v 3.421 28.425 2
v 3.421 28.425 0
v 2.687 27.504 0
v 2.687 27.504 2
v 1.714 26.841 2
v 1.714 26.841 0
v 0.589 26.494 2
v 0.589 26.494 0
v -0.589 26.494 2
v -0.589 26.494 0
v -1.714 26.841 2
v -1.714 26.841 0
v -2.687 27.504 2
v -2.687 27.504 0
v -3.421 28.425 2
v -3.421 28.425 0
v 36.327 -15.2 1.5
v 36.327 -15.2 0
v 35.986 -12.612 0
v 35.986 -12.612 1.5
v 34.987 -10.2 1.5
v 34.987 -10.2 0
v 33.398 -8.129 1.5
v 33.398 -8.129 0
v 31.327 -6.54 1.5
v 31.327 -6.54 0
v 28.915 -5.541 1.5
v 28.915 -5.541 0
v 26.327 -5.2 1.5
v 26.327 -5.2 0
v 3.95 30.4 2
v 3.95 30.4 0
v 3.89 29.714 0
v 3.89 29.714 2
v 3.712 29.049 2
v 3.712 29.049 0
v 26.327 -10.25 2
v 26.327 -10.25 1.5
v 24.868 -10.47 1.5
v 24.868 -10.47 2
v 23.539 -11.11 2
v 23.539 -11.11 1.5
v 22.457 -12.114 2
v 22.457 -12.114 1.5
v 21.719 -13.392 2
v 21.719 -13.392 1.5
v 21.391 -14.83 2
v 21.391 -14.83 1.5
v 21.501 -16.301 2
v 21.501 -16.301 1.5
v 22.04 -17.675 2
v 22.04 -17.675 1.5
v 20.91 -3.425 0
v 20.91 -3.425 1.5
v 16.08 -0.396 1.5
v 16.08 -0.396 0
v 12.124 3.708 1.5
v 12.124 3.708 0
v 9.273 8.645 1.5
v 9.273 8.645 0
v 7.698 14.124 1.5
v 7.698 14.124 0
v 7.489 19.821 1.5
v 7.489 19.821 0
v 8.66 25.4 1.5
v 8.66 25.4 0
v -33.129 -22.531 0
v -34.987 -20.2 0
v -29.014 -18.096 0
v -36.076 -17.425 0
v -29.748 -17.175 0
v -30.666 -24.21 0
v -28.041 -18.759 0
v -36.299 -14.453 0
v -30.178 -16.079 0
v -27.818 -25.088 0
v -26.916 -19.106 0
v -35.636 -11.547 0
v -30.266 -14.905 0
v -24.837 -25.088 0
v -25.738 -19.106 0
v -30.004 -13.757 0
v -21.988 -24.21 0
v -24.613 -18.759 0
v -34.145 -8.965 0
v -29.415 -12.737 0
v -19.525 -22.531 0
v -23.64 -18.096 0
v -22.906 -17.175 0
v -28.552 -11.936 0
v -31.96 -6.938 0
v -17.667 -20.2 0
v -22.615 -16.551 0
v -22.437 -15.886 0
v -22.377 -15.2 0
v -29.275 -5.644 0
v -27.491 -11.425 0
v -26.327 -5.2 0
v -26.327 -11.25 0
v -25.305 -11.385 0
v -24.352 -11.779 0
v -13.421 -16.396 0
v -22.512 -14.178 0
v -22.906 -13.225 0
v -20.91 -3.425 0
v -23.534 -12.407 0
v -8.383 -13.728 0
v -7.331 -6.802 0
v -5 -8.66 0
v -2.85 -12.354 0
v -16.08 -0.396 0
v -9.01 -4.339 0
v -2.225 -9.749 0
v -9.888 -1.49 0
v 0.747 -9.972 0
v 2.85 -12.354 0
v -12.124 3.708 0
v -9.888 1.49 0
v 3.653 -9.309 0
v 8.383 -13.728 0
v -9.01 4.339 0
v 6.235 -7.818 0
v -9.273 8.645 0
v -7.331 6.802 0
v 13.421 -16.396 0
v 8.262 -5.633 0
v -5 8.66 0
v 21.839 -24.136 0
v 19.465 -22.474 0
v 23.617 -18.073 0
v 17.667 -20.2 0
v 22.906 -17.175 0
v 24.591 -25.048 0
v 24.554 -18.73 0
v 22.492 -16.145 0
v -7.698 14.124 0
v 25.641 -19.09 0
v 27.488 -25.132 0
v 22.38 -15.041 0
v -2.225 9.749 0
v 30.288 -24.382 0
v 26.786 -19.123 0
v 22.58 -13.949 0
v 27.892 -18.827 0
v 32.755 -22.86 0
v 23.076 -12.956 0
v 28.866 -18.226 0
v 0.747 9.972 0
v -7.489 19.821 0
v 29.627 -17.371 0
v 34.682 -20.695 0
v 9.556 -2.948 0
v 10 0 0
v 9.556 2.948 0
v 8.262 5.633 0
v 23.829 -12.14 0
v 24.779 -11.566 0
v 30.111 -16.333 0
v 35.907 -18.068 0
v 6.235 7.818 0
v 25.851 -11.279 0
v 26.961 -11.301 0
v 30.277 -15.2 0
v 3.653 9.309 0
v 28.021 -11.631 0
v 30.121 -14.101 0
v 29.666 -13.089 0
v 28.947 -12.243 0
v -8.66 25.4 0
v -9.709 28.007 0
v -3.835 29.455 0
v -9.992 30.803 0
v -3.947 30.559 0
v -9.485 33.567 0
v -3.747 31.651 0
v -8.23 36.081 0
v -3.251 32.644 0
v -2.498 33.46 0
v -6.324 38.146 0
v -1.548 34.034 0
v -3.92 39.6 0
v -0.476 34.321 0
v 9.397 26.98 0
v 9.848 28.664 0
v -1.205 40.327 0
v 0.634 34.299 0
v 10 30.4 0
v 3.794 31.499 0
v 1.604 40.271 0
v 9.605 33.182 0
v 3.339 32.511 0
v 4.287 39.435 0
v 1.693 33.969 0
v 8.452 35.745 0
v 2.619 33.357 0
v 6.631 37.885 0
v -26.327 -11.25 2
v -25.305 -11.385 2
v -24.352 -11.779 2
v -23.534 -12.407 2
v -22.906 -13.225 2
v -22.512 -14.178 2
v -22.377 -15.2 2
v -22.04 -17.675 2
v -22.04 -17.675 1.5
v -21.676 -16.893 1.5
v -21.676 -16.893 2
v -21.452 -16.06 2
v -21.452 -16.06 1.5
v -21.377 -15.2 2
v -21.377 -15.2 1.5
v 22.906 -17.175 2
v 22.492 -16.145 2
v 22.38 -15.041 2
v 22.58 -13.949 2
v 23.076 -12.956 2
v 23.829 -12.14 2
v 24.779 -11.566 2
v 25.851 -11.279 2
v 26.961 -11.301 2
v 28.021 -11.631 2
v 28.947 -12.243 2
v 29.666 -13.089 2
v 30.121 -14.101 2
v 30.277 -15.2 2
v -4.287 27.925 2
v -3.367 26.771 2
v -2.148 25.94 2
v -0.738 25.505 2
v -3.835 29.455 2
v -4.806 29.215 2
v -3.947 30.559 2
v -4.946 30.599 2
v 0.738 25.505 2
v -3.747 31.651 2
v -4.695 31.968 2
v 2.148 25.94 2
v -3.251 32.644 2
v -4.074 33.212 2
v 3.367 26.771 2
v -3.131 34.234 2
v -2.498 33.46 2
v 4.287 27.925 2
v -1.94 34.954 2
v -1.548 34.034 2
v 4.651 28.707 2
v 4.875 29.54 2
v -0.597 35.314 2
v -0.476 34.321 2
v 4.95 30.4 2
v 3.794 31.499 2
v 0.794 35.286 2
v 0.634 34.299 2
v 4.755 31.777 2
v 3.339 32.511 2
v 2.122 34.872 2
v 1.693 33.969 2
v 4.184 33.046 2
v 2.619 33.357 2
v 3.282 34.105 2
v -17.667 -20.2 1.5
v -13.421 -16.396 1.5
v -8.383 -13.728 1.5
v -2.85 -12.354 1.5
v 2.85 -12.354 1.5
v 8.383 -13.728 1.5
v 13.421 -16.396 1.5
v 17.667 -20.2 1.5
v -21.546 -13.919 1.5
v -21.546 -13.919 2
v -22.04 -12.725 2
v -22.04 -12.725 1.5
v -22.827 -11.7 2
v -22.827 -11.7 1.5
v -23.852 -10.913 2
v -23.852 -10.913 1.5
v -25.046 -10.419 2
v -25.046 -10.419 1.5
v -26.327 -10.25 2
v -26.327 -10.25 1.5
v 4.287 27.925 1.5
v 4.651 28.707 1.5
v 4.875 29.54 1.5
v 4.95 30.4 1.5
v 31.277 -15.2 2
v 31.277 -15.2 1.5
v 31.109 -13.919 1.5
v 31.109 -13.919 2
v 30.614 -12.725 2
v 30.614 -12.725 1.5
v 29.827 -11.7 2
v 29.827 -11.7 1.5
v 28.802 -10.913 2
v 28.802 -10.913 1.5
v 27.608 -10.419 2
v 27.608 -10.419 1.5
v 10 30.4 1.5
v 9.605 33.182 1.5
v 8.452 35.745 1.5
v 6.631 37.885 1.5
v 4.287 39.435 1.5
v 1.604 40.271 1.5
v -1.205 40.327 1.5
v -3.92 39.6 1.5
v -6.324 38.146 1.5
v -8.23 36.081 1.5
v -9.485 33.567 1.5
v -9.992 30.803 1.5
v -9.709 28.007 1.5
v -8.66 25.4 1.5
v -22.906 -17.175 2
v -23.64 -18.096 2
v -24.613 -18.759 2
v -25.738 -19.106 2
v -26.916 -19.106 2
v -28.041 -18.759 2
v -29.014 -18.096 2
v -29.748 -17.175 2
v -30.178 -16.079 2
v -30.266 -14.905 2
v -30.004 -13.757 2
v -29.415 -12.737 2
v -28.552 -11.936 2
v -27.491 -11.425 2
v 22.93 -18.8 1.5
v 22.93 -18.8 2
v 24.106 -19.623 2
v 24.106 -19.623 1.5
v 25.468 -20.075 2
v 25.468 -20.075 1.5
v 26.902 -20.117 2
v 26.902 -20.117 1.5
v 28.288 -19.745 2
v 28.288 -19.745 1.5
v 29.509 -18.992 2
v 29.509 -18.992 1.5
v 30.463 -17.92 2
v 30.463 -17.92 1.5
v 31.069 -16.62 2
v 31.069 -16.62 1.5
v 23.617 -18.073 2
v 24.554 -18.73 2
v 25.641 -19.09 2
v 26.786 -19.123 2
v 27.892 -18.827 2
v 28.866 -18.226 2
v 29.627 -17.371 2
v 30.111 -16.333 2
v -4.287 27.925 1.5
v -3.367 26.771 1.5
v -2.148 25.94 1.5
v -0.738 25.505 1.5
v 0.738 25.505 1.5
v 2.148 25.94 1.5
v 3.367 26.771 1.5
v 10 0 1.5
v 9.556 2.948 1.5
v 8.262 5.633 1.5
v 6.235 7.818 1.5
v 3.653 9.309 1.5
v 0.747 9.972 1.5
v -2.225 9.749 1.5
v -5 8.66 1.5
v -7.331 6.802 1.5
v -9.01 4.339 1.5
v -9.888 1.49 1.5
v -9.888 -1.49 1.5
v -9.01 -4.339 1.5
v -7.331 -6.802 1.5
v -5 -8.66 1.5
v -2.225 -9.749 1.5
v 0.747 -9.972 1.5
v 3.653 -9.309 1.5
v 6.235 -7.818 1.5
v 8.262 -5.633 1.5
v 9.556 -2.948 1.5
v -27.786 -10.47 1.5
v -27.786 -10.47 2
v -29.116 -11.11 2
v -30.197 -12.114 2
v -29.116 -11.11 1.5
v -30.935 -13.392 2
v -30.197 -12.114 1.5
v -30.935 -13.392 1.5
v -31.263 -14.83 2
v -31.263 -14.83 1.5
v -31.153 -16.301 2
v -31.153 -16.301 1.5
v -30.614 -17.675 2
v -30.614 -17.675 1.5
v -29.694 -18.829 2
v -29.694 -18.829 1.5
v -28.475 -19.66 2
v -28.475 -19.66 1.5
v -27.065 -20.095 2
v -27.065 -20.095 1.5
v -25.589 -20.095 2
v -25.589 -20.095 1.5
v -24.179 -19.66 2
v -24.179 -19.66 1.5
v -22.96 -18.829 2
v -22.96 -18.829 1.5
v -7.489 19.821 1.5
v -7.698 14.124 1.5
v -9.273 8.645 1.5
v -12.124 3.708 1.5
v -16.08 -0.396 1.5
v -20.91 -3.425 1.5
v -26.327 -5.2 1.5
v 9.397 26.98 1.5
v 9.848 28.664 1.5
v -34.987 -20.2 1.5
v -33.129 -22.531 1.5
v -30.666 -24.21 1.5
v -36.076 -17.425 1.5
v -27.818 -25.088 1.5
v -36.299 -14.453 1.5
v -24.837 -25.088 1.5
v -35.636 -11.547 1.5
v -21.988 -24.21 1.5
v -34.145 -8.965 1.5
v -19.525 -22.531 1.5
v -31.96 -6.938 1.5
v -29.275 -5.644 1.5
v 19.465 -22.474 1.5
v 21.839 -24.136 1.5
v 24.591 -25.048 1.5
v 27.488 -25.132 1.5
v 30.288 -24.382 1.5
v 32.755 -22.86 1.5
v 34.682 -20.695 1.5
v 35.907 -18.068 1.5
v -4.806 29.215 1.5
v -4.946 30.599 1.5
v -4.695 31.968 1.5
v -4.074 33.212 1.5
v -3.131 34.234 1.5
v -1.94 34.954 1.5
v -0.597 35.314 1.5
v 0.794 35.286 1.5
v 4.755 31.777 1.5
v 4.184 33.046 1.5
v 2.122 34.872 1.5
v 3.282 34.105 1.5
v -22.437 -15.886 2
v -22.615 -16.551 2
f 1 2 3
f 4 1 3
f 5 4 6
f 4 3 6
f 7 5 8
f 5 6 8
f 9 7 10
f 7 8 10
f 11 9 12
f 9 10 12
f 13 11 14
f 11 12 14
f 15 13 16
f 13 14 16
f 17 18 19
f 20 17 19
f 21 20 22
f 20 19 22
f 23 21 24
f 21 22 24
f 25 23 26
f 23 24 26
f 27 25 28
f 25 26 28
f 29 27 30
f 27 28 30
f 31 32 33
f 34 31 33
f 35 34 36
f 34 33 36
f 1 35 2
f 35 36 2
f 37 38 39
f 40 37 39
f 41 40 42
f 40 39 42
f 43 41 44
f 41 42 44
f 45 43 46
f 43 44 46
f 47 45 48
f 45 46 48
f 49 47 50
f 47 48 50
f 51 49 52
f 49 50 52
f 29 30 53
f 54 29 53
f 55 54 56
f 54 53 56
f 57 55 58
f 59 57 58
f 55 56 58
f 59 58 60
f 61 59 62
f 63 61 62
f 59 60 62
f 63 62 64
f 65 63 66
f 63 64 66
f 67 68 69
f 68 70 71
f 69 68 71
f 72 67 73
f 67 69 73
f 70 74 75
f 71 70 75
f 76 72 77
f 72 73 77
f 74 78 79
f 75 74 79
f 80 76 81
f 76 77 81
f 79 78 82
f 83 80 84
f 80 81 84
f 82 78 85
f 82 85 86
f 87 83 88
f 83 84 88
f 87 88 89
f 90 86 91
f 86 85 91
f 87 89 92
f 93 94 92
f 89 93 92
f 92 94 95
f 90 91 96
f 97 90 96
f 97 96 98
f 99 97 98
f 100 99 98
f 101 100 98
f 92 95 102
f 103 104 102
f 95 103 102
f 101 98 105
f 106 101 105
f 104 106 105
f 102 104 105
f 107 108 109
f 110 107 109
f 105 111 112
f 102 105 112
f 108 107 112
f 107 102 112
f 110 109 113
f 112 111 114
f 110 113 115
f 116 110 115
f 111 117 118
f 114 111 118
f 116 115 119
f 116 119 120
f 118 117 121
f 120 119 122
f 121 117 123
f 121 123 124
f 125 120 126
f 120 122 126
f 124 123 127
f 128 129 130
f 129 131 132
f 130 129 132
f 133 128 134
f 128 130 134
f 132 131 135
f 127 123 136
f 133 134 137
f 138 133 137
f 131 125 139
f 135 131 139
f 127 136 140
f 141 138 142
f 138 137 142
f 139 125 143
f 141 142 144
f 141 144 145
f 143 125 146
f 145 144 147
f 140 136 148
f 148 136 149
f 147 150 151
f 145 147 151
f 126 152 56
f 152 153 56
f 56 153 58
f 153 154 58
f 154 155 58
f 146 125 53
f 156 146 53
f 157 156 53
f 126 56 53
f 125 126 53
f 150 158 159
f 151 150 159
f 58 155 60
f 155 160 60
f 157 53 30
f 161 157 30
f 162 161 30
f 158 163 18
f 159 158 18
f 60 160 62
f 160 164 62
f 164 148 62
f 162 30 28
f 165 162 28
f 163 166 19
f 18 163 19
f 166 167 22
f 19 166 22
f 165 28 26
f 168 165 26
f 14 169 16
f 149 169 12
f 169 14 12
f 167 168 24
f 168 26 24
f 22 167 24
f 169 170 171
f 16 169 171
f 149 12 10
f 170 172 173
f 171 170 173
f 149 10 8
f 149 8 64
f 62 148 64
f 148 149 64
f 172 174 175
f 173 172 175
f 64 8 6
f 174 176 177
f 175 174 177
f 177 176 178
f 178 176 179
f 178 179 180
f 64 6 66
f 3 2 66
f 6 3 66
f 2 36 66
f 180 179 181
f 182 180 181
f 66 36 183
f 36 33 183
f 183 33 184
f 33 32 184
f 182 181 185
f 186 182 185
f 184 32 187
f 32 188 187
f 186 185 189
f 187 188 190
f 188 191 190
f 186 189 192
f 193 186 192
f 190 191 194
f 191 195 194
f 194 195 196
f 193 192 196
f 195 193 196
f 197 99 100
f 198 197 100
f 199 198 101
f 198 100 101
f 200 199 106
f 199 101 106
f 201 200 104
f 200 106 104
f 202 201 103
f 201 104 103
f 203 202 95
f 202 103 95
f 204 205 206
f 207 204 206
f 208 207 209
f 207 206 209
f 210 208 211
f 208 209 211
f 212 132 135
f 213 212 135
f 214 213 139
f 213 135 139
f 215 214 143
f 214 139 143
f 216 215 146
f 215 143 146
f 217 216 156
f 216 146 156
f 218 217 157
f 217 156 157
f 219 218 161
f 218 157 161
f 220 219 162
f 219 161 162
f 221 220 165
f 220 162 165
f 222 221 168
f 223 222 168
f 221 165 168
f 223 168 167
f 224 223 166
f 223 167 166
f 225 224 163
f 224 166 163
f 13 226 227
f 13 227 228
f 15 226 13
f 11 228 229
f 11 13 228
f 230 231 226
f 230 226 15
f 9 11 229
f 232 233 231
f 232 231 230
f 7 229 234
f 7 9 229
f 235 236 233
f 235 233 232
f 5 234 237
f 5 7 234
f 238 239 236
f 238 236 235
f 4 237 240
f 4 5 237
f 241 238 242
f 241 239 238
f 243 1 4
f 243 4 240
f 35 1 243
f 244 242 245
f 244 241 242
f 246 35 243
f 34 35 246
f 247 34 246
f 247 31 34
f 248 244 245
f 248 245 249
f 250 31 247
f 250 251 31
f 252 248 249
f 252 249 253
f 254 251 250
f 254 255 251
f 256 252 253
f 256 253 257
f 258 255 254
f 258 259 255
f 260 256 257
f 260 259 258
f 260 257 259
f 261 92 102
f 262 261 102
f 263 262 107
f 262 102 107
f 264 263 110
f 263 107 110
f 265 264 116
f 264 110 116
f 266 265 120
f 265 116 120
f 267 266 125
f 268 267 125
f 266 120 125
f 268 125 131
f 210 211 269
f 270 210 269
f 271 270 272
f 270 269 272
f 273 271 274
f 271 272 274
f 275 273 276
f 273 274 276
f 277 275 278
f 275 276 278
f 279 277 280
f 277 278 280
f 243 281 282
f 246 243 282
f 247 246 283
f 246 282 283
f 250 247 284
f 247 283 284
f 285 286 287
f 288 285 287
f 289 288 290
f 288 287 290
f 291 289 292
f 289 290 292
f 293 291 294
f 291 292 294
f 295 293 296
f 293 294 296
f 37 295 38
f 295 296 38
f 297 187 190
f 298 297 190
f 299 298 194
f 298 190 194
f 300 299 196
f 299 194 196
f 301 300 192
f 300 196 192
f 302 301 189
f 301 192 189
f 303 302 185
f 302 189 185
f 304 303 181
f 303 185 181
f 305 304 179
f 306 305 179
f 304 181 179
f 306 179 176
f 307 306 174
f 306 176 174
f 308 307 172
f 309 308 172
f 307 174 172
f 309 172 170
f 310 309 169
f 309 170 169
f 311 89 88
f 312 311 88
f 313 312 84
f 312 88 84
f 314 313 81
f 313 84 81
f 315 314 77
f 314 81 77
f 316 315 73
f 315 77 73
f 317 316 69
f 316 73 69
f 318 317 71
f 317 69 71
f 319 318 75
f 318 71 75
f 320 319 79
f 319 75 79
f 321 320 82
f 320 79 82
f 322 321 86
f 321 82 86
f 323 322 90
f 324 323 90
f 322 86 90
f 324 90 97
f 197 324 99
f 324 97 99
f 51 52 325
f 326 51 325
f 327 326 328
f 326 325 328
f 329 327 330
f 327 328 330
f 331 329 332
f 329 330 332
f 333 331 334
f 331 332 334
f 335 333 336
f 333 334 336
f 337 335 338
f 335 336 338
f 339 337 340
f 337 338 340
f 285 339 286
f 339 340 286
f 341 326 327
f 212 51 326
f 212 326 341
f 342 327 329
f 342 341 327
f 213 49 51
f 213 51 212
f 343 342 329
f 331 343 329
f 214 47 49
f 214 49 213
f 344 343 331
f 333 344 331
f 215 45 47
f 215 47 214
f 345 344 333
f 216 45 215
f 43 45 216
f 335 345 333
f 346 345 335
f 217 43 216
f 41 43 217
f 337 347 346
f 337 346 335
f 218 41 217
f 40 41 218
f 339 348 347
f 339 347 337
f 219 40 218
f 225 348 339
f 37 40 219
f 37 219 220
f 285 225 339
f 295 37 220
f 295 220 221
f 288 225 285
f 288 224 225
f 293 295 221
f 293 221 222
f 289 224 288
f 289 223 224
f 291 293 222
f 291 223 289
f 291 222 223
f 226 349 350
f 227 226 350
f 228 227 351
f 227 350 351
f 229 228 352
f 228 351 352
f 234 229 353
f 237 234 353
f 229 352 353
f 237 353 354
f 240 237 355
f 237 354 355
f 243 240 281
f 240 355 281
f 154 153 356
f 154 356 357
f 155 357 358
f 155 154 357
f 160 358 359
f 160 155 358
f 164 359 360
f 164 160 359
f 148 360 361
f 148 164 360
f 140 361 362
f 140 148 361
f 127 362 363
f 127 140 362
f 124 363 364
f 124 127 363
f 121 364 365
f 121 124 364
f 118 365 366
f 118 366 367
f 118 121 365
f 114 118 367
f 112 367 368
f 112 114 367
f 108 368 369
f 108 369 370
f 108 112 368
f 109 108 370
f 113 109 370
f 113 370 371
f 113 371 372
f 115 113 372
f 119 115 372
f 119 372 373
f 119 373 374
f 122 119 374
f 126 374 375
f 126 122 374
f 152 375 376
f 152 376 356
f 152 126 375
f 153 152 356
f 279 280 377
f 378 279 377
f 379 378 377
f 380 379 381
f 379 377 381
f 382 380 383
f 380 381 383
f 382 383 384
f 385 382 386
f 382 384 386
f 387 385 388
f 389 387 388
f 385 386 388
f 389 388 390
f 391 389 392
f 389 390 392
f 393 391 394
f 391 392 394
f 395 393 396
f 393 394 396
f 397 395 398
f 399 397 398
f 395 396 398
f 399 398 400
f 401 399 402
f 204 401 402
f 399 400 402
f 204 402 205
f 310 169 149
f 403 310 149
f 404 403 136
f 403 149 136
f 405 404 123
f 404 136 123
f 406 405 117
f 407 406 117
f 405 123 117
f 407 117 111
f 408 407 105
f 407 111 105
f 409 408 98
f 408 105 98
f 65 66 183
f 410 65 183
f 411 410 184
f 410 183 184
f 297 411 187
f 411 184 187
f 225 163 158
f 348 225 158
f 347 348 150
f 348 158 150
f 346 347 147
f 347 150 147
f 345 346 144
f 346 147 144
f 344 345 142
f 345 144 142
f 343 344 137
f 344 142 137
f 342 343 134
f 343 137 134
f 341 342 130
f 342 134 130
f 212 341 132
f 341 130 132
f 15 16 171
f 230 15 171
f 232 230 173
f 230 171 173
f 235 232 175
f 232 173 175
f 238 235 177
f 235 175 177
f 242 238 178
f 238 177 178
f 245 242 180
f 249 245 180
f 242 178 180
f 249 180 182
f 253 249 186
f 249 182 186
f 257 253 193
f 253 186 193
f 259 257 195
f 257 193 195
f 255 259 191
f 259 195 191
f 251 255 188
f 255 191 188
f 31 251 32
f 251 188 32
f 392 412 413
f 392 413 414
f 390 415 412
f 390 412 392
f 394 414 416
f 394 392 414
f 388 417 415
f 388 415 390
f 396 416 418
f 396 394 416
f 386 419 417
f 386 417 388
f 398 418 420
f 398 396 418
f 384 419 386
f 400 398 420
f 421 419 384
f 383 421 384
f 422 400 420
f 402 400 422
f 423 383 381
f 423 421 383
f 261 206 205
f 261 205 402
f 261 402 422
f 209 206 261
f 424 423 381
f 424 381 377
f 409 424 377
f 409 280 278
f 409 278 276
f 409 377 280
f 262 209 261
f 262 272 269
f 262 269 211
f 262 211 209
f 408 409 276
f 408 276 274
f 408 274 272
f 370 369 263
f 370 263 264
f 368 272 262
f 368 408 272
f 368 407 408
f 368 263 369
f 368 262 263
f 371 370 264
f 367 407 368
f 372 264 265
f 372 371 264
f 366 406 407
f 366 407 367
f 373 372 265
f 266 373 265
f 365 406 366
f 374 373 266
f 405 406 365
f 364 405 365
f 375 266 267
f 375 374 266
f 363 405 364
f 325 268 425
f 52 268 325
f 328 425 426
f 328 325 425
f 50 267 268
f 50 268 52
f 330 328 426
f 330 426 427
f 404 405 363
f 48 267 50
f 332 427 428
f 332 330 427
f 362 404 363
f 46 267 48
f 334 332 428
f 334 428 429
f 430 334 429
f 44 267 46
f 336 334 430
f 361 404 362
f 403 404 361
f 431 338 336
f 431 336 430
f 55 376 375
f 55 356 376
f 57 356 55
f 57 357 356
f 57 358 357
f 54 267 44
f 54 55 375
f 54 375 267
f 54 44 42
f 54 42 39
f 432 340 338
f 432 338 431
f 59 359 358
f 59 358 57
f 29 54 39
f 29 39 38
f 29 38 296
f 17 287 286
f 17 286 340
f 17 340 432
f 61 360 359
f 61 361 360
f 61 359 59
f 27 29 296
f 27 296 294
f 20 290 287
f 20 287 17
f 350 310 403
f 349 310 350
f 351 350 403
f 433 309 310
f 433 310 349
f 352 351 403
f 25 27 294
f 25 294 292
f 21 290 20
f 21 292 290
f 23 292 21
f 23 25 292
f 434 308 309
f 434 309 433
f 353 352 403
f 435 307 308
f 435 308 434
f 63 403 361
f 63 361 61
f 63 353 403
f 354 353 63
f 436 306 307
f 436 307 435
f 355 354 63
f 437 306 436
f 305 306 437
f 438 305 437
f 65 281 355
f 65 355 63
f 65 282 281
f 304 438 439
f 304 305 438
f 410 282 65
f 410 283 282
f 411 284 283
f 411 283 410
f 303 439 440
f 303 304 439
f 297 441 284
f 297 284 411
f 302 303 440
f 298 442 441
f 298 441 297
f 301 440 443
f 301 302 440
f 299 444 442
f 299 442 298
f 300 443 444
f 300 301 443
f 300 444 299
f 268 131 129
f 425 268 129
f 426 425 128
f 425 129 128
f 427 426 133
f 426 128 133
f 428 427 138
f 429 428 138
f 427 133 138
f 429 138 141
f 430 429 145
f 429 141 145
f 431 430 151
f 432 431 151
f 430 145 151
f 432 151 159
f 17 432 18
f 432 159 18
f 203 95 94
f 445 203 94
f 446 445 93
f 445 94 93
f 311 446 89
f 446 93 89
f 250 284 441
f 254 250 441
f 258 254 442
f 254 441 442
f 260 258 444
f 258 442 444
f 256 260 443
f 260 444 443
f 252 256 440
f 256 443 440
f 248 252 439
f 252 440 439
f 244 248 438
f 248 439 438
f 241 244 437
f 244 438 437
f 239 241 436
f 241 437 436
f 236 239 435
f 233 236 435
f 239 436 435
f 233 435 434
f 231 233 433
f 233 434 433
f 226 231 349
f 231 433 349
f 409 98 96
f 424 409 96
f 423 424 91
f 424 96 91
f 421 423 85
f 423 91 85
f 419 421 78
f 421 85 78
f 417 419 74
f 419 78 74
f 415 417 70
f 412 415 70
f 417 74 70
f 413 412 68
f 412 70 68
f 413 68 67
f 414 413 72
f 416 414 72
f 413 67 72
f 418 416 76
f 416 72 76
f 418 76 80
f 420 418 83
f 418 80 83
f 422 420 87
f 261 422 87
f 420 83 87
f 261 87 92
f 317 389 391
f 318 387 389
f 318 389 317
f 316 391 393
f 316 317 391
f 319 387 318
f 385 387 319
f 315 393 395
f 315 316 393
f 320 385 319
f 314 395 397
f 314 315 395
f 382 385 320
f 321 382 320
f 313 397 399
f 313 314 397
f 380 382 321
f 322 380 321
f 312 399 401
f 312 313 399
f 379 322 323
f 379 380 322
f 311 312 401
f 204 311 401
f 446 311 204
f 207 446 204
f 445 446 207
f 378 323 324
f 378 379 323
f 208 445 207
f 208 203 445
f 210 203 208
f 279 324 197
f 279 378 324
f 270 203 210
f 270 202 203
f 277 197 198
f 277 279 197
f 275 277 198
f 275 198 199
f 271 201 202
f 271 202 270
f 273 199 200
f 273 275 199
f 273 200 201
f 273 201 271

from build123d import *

# Parameters (mm, degrees)
F0_R     = 10
F1_DEPTH = 1.5
F2_DEPTH = 2


with BuildPart() as f1:
    # F0 (on Top) → F1 (new body)
    with BuildSketch(Plane.XY):
        with BuildLine():
            ThreePointArc((8.6602540378, 25.4), (0, 20.4), (-8.6602540378, 25.4))
            ThreePointArc((-8.6602540378, 25.4), (-10.5481894181, 6.09), (-26.327172275, -5.2))
            ThreePointArc((-26.327172275, -5.2), (-19.2561044632, -8.1289321881), (-16.327172275, -15.2))
            ThreePointArc((-16.327172275, -15.2), (-16.6679140122, -17.788190451), (-17.6669182372, -20.2))
            ThreePointArc((-17.6669182372, -20.2), (0, -12.18), (17.6669182372, -20.2))
            ThreePointArc((17.6669182372, -20.2), (17.6669182372, -10.2), (26.327172275, -5.2))
            ThreePointArc((26.327172275, -5.2), (10.5481894181, 6.09), (8.6602540378, 25.4))
        make_face()
        Circle(F0_R, mode=Mode.SUBTRACT)
        with BuildLine():
            ThreePointArc((4.2868257487, 27.925), (0, 25.45), (-4.2868257487, 27.925))
            Line((-4.2868257487, 27.925), (-8.6602540378, 25.4))
            ThreePointArc((-8.6602540378, 25.4), (0, 20.4), (8.6602540378, 25.4))
            Line((8.6602540378, 25.4), (4.2868257487, 27.925))
        make_face()
        with BuildLine():
            Line((-8.6602540378, 25.4), (-4.2868257487, 27.925))
            ThreePointArc((-4.2868257487, 27.925), (-1.2811542733, 35.1813328401), (4.95, 30.4))
            ThreePointArc((4.95, 30.4), (4.7813328401, 29.1188457267), (4.2868257487, 27.925))
            Line((4.2868257487, 27.925), (8.6602540378, 25.4))
            ThreePointArc((8.6602540378, 25.4), (9.6592582629, 27.811809549), (10, 30.4))
            ThreePointArc((10, 30.4), (-2.588190451, 40.0592582629), (-8.6602540378, 25.4))
        make_face()
        with BuildLine():
            Line((26.327172275, -10.25), (26.327172275, -5.2))
            ThreePointArc((26.327172275, -5.2), (17.6669182372, -10.2), (17.6669182372, -20.2))
            Line((17.6669182372, -20.2), (22.0403465263, -17.675))
            ThreePointArc((22.0403465263, -17.675), (22.0403465263, -12.725), (26.327172275, -10.25))
        make_face()
        with BuildLine():
            ThreePointArc((36.327172275, -15.2), (33.3982400869, -8.1289321881), (26.327172275, -5.2))
            Line((26.327172275, -5.2), (26.327172275, -10.25))
            ThreePointArc((26.327172275, -10.25), (29.8273508419, -11.6998214331), (31.277172275, -15.2))
            ThreePointArc((31.277172275, -15.2), (27.6083265483, -19.9813328401), (22.0403465263, -17.675))
            Line((22.0403465263, -17.675), (17.6669182372, -20.2))
            ThreePointArc((17.6669182372, -20.2), (28.9153627261, -24.8592582629), (36.327172275, -15.2))
        make_face()
        with BuildLine():
            ThreePointArc((-16.327172275, -15.2), (-19.2561044632, -8.1289321881), (-26.327172275, -5.2))
            Line((-26.327172275, -5.2), (-26.327172275, -10.25))
            ThreePointArc((-26.327172275, -10.25), (-22.8269937082, -11.6998214331), (-21.377172275, -15.2))
            ThreePointArc((-21.377172275, -15.2), (-21.5458394349, -16.4811542733), (-22.0403465263, -17.675))
            Line((-22.0403465263, -17.675), (-17.6669182372, -20.2))
            ThreePointArc((-17.6669182372, -20.2), (-16.6679140122, -17.788190451), (-16.327172275, -15.2))
        make_face()
        with BuildLine():
            Line((-26.327172275, -10.25), (-26.327172275, -5.2))
            ThreePointArc((-26.327172275, -5.2), (-34.9874263129, -20.2), (-17.6669182372, -20.2))
            Line((-17.6669182372, -20.2), (-22.0403465263, -17.675))
            ThreePointArc((-22.0403465263, -17.675), (-30.6139980238, -17.675), (-26.327172275, -10.25))
        make_face()
    extrude(amount=F1_DEPTH)

    # F0 (on Top) → F2 (join)
    with BuildSketch(Plane.XY):
        with BuildLine():
            ThreePointArc((3.4208003449, 28.425), (0, 26.45), (-3.4208003449, 28.425))
            Line((-3.4208003449, 28.425), (-4.2868257487, 27.925))
            ThreePointArc((-4.2868257487, 27.925), (0, 25.45), (4.2868257487, 27.925))
            Line((4.2868257487, 27.925), (3.4208003449, 28.425))
        make_face()
        with BuildLine():
            ThreePointArc((-3.4208003449, 28.425), (-1.0223352282, 34.2154070138), (3.95, 30.4))
            ThreePointArc((3.95, 30.4), (3.8154070138, 29.3776647718), (3.4208003449, 28.425))
            Line((3.4208003449, 28.425), (4.2868257487, 27.925))
            ThreePointArc((4.2868257487, 27.925), (4.7813328401, 29.1188457267), (4.95, 30.4))
            ThreePointArc((4.95, 30.4), (-1.2811542733, 35.1813328401), (-4.2868257487, 27.925))
            Line((-4.2868257487, 27.925), (-3.4208003449, 28.425))
        make_face()
        with BuildLine():
            Line((26.327172275, -11.25), (26.327172275, -10.25))
            ThreePointArc((26.327172275, -10.25), (22.0403465263, -12.725), (22.0403465263, -17.675))
            Line((22.0403465263, -17.675), (22.9063719301, -17.175))
            ThreePointArc((22.9063719301, -17.175), (22.9063719301, -13.225), (26.327172275, -11.25))
        make_face()
        with BuildLine():
            ThreePointArc((31.277172275, -15.2), (29.8273508419, -11.6998214331), (26.327172275, -10.25))
            Line((26.327172275, -10.25), (26.327172275, -11.25))
            ThreePointArc((26.327172275, -11.25), (29.1202440607, -12.4069282143), (30.277172275, -15.2))
            ThreePointArc((30.277172275, -15.2), (27.3495075032, -19.0154070138), (22.9063719301, -17.175))
            Line((22.9063719301, -17.175), (22.0403465263, -17.675))
            ThreePointArc((22.0403465263, -17.675), (27.6083265483, -19.9813328401), (31.277172275, -15.2))
        make_face()
        with BuildLine():
            ThreePointArc((-21.377172275, -15.2), (-22.8269937082, -11.6998214331), (-26.327172275, -10.25))
            Line((-26.327172275, -10.25), (-26.327172275, -11.25))
            ThreePointArc((-26.327172275, -11.25), (-23.5341004894, -12.4069282143), (-22.377172275, -15.2))
            ThreePointArc((-22.377172275, -15.2), (-22.5117652612, -16.2223352282), (-22.9063719301, -17.175))
            Line((-22.9063719301, -17.175), (-22.0403465263, -17.675))
            ThreePointArc((-22.0403465263, -17.675), (-21.5458394349, -16.4811542733), (-21.377172275, -15.2))
        make_face()
        with BuildLine():
            Line((-26.327172275, -11.25), (-26.327172275, -10.25))
            ThreePointArc((-26.327172275, -10.25), (-30.6139980238, -17.675), (-22.0403465263, -17.675))
            Line((-22.0403465263, -17.675), (-22.9063719301, -17.175))
            ThreePointArc((-22.9063719301, -17.175), (-29.74797262, -17.175), (-26.327172275, -11.25))
        make_face()
    extrude(amount=F2_DEPTH)


solid = f1.part
